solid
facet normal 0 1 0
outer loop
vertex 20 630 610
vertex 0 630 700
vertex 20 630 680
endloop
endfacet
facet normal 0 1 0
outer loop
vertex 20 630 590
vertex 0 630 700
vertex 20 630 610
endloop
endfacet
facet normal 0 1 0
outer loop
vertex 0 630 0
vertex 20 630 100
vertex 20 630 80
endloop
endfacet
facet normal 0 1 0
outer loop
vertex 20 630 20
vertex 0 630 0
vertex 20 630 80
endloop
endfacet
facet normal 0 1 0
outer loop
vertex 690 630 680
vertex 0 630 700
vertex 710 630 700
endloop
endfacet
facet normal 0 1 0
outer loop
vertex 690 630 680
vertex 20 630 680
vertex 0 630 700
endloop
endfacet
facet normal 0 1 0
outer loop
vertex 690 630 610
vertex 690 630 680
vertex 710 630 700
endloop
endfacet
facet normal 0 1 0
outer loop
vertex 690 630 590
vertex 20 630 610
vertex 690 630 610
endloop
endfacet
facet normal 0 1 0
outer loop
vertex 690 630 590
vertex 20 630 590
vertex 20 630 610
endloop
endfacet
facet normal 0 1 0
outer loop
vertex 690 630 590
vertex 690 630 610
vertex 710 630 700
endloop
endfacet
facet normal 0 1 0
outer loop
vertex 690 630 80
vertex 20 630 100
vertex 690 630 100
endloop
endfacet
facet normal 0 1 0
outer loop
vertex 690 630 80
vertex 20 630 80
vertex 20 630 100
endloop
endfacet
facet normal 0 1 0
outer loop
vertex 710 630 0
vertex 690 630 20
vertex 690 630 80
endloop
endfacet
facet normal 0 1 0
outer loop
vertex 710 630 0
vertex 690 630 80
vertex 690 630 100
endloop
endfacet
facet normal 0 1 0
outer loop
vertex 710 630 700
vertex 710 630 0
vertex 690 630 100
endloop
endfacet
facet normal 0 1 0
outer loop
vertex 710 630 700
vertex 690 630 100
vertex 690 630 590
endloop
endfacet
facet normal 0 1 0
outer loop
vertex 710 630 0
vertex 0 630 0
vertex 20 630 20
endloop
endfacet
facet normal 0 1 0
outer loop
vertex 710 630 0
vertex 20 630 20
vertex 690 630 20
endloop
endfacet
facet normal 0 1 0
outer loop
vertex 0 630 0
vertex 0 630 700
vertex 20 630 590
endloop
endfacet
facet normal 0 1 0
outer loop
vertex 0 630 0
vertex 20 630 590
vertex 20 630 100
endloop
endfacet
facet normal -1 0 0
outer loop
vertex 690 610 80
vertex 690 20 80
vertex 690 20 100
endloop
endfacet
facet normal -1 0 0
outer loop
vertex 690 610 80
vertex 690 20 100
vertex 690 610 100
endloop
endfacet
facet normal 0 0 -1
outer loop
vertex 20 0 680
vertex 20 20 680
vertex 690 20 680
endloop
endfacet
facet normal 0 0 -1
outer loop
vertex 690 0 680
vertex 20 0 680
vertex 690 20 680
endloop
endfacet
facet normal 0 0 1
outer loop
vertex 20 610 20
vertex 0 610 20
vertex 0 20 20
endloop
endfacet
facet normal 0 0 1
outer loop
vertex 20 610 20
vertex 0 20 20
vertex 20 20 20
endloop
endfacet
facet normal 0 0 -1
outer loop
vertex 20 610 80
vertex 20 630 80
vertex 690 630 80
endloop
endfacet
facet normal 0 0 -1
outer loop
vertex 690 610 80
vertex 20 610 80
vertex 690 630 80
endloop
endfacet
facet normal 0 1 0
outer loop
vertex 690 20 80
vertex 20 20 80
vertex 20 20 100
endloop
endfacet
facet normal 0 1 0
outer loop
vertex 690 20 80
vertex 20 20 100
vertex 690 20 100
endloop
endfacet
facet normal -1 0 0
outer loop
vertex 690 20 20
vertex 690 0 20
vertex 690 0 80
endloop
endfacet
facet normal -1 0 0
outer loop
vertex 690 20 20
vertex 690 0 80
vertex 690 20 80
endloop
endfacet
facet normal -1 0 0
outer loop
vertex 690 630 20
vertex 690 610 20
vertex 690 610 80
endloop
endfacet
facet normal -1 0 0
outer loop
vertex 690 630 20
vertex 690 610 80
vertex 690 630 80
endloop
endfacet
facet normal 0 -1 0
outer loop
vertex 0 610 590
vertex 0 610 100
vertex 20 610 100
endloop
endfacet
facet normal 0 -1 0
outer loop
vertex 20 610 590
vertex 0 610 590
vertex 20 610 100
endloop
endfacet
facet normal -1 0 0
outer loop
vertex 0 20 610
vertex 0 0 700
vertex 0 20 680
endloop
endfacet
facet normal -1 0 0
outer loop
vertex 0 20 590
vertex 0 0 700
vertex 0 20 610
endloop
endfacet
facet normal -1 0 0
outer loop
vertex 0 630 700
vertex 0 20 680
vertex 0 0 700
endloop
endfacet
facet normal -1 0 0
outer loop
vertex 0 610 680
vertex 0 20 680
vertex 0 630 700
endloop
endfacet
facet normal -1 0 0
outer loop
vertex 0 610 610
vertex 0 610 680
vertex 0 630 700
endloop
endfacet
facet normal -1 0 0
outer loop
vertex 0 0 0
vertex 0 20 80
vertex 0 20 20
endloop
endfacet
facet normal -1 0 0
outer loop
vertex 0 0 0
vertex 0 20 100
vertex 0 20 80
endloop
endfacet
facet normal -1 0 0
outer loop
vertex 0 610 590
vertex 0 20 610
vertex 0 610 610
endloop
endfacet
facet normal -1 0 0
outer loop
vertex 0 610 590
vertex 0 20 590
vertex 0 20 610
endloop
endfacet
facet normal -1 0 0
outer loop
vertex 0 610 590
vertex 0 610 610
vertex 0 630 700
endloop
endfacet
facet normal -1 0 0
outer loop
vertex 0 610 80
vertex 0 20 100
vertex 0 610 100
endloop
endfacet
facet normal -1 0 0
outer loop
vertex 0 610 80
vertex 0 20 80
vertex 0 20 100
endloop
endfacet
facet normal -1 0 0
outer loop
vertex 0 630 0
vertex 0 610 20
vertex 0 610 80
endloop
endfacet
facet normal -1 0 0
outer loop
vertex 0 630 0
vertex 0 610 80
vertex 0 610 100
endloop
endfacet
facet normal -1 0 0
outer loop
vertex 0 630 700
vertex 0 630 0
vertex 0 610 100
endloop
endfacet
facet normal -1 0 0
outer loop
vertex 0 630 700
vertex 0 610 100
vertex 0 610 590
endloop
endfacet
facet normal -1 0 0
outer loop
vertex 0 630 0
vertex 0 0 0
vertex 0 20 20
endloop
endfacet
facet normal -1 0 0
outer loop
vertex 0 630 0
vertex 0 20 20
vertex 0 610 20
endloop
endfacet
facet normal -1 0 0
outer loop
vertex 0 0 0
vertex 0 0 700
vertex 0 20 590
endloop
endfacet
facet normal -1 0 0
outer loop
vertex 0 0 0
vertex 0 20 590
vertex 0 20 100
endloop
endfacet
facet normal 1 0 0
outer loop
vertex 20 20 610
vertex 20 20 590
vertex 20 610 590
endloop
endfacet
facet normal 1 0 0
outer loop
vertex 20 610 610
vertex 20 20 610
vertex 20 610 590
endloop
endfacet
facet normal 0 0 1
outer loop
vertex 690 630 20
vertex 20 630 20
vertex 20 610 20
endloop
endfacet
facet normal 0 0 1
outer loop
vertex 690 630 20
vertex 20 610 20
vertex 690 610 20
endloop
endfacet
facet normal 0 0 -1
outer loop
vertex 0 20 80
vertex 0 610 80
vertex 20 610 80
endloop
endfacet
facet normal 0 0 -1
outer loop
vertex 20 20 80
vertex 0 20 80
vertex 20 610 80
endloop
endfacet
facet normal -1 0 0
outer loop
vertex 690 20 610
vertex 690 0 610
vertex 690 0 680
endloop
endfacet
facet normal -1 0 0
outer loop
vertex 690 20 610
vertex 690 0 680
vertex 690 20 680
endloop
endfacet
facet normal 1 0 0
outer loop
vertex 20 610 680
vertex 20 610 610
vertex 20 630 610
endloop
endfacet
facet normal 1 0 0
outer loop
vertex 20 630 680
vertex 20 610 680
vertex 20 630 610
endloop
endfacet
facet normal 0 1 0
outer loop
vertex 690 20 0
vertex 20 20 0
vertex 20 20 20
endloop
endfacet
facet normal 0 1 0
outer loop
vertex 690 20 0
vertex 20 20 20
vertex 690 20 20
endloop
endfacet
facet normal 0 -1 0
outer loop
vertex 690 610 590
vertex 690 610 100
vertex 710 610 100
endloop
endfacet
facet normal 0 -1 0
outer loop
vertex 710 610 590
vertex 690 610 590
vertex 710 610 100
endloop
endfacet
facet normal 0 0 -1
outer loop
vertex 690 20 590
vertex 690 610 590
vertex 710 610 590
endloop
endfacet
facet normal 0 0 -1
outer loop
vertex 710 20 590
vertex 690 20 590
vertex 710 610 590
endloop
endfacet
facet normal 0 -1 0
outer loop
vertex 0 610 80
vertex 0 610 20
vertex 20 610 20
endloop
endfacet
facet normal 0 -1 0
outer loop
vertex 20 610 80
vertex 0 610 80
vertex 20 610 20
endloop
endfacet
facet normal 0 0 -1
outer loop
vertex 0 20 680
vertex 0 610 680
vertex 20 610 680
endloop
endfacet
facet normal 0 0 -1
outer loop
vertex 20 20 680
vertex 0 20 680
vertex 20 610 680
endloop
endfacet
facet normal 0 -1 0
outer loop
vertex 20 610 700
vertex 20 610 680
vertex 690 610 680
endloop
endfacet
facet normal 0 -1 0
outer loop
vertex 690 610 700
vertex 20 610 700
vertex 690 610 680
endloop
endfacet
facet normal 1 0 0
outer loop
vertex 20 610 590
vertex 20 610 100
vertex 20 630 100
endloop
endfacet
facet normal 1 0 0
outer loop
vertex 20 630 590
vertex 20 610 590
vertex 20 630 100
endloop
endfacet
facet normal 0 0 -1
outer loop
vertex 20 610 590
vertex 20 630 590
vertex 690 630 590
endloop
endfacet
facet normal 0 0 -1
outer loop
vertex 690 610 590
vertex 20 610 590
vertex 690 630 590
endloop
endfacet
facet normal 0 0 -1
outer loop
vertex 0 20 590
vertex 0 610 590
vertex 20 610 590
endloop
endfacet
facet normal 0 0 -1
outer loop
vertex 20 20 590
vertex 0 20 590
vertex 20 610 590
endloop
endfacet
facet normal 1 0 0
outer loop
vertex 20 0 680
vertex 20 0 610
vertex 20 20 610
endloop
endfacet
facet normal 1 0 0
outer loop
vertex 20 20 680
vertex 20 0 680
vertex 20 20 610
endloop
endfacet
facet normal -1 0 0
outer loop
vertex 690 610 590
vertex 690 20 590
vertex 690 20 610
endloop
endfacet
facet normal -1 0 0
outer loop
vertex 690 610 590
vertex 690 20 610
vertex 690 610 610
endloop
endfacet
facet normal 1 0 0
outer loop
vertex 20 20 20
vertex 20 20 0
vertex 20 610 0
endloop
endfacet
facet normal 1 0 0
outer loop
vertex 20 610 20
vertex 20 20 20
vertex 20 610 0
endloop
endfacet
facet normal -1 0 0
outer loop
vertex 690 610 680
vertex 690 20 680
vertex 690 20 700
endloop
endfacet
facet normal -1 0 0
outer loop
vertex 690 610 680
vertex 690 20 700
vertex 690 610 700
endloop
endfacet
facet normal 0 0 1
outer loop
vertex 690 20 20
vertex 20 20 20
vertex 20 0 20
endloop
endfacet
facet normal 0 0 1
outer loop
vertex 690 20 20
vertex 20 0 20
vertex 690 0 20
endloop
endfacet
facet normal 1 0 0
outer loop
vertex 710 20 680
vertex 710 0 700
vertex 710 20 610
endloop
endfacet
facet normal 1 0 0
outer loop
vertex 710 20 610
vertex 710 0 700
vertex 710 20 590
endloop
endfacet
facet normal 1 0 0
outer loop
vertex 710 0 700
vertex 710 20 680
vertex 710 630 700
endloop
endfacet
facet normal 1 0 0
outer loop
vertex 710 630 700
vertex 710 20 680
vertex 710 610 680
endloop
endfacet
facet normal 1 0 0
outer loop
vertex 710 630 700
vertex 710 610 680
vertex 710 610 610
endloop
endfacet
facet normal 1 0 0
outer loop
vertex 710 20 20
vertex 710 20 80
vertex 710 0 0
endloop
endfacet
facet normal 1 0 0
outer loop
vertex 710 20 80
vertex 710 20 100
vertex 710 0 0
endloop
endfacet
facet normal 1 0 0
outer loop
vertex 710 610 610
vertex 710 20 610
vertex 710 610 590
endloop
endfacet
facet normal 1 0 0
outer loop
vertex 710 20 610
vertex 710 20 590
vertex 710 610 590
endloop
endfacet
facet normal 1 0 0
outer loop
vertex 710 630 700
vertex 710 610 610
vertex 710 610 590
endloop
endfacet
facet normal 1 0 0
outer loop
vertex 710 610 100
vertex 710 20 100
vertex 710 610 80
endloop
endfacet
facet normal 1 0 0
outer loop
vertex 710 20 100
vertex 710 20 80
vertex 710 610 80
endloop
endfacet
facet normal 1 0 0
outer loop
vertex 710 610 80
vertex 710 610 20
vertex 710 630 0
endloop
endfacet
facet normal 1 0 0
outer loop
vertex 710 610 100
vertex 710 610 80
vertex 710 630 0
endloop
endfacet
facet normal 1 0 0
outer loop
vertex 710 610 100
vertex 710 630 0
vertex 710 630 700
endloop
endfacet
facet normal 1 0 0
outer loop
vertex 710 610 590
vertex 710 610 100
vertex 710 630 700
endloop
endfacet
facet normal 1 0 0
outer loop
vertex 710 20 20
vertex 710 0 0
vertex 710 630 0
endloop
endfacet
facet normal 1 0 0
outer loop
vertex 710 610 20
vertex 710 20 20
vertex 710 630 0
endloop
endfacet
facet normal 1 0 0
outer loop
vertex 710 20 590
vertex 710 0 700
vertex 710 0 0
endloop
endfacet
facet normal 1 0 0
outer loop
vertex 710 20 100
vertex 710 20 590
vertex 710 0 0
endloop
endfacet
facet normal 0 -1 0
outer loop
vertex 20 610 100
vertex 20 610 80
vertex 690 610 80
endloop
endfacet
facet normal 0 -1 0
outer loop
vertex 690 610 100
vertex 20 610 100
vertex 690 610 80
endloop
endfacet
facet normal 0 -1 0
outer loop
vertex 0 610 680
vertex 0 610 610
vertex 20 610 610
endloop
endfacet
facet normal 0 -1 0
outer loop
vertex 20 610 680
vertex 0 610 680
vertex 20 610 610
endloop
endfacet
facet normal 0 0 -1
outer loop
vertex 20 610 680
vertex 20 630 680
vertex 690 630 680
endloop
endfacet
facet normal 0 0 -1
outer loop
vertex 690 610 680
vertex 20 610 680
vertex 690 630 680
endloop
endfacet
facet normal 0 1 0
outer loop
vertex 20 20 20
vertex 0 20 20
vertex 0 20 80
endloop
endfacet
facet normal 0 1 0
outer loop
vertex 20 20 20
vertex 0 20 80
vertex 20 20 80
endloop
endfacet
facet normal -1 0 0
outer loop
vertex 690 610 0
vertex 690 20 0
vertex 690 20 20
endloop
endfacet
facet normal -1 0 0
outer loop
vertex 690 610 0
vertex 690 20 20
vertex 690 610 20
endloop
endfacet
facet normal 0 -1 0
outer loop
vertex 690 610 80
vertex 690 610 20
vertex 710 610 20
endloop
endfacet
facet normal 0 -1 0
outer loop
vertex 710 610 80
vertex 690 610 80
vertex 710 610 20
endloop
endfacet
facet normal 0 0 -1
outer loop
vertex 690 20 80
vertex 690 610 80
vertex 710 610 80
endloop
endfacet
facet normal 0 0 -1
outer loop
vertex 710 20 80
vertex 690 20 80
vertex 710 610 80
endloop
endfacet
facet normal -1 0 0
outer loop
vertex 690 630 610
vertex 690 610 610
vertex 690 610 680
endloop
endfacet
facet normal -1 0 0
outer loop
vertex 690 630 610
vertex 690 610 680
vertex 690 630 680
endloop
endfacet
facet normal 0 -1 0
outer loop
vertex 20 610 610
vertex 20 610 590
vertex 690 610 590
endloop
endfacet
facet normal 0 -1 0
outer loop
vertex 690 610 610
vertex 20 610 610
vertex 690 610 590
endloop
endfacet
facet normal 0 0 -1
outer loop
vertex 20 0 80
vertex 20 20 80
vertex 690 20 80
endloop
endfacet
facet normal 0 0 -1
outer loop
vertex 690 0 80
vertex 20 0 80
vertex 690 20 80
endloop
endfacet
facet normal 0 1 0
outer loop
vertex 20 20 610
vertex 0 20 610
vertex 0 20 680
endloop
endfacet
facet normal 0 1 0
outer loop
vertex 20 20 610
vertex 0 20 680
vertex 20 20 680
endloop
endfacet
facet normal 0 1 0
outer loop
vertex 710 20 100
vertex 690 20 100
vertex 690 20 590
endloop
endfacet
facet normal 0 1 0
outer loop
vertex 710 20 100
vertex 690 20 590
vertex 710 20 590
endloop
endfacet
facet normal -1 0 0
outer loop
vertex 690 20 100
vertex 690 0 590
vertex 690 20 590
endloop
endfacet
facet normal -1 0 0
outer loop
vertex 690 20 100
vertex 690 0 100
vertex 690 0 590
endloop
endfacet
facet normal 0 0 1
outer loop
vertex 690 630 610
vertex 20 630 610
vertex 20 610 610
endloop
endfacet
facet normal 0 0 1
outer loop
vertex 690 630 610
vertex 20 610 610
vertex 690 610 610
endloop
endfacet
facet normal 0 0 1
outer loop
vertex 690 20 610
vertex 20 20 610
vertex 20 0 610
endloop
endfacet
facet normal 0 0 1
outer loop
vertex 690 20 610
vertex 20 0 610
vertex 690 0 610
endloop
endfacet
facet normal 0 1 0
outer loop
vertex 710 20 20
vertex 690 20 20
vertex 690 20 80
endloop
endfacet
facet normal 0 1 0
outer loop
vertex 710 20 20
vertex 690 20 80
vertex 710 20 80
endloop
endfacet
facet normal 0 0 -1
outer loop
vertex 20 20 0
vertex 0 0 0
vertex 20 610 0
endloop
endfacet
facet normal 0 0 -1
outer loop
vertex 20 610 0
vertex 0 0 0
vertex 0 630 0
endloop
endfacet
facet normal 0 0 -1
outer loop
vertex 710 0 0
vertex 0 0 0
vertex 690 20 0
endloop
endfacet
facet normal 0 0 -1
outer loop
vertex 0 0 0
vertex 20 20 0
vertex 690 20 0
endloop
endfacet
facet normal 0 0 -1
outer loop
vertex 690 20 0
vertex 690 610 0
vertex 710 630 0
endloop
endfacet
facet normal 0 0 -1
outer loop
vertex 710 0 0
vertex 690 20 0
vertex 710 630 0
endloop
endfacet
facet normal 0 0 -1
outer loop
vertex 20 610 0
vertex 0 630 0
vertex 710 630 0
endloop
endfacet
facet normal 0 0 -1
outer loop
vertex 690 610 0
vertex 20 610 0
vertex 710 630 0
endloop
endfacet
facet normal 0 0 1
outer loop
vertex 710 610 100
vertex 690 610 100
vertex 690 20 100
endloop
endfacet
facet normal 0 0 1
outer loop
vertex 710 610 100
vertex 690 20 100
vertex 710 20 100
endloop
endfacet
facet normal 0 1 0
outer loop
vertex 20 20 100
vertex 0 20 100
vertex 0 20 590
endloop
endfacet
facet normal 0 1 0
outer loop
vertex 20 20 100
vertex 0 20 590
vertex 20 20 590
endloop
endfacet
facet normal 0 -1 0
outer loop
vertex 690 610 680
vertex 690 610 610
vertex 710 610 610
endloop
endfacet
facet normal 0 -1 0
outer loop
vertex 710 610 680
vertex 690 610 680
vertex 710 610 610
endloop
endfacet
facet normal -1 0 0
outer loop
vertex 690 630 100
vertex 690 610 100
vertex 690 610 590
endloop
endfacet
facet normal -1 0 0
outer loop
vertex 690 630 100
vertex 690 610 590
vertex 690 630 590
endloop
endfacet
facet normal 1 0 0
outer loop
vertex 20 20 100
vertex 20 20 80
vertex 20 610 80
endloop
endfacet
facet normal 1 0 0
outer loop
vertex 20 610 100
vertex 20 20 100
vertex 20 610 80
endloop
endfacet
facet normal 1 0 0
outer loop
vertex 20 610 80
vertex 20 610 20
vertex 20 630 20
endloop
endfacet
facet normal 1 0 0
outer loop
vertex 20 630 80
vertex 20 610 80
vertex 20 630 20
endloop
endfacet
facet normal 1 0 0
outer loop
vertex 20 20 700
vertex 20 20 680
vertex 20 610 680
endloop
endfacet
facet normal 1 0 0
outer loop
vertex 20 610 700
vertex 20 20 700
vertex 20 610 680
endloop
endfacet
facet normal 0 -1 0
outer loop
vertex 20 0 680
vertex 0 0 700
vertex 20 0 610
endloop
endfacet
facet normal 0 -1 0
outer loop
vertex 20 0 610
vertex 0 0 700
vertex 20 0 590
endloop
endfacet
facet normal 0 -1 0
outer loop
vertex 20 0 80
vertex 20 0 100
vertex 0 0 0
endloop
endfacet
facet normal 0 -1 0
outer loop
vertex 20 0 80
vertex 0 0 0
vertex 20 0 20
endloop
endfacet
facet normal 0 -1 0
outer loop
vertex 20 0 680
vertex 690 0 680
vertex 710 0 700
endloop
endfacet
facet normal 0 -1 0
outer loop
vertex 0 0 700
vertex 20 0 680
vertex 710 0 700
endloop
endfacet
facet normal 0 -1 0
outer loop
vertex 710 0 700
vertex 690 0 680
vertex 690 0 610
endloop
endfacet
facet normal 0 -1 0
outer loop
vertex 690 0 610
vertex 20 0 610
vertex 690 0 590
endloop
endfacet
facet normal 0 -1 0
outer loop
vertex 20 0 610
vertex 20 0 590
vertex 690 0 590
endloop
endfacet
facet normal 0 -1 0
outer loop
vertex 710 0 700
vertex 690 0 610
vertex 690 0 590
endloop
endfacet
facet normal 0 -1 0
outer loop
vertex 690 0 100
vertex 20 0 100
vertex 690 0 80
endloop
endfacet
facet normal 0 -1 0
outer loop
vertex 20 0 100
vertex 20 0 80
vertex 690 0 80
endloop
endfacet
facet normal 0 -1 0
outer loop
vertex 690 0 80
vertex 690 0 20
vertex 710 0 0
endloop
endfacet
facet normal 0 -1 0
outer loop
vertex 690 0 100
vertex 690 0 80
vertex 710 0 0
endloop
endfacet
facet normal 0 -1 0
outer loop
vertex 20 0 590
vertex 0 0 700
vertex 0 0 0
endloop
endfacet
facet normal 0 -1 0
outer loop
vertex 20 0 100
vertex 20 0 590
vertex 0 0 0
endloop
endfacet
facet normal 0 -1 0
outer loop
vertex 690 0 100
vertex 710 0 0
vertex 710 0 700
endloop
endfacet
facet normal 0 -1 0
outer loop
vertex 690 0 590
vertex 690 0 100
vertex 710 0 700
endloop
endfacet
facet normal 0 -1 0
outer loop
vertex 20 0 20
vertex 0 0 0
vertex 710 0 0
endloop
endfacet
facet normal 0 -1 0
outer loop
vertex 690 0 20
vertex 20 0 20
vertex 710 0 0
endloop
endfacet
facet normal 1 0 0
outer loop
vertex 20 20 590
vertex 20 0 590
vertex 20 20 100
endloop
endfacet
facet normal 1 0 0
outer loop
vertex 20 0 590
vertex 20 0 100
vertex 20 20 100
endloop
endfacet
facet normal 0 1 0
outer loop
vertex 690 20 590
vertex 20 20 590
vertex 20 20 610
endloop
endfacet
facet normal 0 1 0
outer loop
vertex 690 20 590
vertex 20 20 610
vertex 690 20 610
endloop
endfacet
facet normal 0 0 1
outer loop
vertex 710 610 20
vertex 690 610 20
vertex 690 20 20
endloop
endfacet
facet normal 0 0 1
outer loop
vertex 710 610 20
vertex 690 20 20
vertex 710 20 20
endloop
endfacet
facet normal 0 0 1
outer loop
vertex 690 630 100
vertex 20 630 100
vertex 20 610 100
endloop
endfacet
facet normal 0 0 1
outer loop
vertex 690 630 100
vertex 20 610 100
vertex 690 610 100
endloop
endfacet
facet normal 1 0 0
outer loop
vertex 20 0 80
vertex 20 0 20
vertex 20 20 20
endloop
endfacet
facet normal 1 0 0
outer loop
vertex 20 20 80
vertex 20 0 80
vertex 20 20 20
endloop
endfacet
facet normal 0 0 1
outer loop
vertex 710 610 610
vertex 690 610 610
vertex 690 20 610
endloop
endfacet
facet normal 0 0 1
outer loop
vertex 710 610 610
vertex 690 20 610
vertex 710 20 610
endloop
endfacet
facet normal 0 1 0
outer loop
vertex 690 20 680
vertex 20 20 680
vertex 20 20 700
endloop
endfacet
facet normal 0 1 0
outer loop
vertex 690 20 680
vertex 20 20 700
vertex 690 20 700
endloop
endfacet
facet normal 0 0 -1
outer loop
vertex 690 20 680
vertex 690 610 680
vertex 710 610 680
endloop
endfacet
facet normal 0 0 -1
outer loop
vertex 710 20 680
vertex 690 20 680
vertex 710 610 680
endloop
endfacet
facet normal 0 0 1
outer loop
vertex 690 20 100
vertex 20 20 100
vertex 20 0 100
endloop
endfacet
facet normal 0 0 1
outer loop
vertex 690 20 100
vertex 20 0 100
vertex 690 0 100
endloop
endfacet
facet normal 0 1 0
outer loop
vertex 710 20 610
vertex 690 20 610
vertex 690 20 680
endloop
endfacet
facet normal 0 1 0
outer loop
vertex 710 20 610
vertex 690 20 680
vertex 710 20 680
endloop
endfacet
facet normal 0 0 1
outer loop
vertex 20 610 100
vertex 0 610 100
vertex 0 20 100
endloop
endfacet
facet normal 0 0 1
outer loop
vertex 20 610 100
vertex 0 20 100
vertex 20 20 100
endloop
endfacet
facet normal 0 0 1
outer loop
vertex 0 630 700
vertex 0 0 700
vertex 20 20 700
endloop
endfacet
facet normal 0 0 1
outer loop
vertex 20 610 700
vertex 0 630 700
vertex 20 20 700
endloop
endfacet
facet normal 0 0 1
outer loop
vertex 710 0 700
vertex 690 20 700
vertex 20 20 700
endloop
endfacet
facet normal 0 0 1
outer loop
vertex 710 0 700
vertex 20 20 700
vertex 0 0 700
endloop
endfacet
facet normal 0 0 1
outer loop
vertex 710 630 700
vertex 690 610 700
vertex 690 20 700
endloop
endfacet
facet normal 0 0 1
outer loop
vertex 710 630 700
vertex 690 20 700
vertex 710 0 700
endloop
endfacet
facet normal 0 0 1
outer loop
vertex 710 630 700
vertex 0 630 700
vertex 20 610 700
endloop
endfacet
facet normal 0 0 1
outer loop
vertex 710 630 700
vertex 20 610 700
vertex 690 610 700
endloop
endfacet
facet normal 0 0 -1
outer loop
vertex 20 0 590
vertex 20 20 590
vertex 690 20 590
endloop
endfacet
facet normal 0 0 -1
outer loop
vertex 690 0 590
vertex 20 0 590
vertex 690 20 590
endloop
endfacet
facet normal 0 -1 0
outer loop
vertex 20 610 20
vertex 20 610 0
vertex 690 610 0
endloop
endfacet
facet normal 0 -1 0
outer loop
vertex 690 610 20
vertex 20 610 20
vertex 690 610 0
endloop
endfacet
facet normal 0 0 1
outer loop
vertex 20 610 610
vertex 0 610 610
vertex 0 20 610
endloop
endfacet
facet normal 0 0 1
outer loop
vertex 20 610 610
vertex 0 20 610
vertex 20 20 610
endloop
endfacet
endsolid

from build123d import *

# Parameters (mm, degrees)
BOX001_W         = 20
BOX001_H         = 590
BOX001_DEPTH     = 20
ARRAY001_X_COUNT = 2
ARRAY001_X_PITCH = 690
ARRAY001_Z_COUNT = 2
ARRAY001_Z_PITCH = 80
BOX003_W         = 20
BOX003_H         = 590
BOX003_DEPTH     = 20
ARRAY002_X_COUNT = 2
ARRAY002_X_PITCH = 690
ARRAY002_Z_COUNT = 2
ARRAY002_Z_PITCH = 90
BOX002_W         = 670
BOX002_H         = 20
BOX002_DEPTH     = 20
ARRAY003_Y_COUNT = 2
ARRAY003_Y_PITCH = 610
ARRAY003_Z_COUNT = 2
ARRAY003_Z_PITCH = 80
BOX004_W         = 670
BOX004_H         = 20
BOX004_DEPTH     = 20
ARRAY004_Y_COUNT = 2
ARRAY004_Y_PITCH = 610
ARRAY004_Z_COUNT = 2
ARRAY004_Z_PITCH = 90
BOX_W            = 20
BOX_H            = 20
BOX_DEPTH        = 700
ARRAY_X_COUNT    = 2
ARRAY_X_PITCH    = 690
ARRAY_Y_COUNT    = 2
ARRAY_Y_PITCH    = 610


with BuildPart() as laterales_inferiores:
    # Box001 → Box001 (new body)
    with BuildSketch(Plane(origin=(0, 20, 0), x_dir=(1, 0, 0), z_dir=(0, 0, 1))):
        with Locations((10, 295)):
            Rectangle(BOX001_W, BOX001_H)
    extrude(amount=BOX001_DEPTH)

    # Array001 X: Laterales inferiores ×2


with BuildPart() as laterales_inferiores_1:
    add(laterales_inferiores.part)
    with Locations(*[(i * ARRAY001_X_PITCH, 0, 0) for i in range(1, ARRAY001_X_COUNT)]):
        add(laterales_inferiores.part)

    # Array001 Z: Laterales inferiores ×2


with BuildPart() as laterales_inferiores_2:
    add(laterales_inferiores_1.part)
    with Locations(*[(0, 0, i * ARRAY001_Z_PITCH) for i in range(1, ARRAY001_Z_COUNT)]):
        add(laterales_inferiores_1.part)


with BuildPart() as laterales_superiores:
    # Box003 → Box003 (new body)
    with BuildSketch(Plane(origin=(0, 20, 0), x_dir=(1, 0, 0), z_dir=(0, 0, 1))):
        with Locations((10, 295)):
            Rectangle(BOX003_W, BOX003_H)
    extrude(amount=BOX003_DEPTH)

    # Array002 X: Laterales Superiores ×2


with BuildPart() as laterales_superiores_1:
    add(laterales_superiores.part)
    with Locations(*[(i * ARRAY002_X_PITCH, 0, 0) for i in range(1, ARRAY002_X_COUNT)]):
        add(laterales_superiores.part)

    # Array002 Z: Laterales Superiores ×2


with BuildPart() as laterales_superiores_2:
    add(laterales_superiores_1.part)
    with Locations(*[(0, 0, i * ARRAY002_Z_PITCH) for i in range(1, ARRAY002_Z_COUNT)]):
        add(laterales_superiores_1.part)


with BuildPart() as laterales_superiores_3:
    # Array002 placement: moved
    add(laterales_superiores_2.part.moved(Location((0, 0, 590))))


with BuildPart() as frontales_inferiores:
    # Box002 → Box002 (new body)
    with BuildSketch(Plane(origin=(20, 0, 0), x_dir=(1, 0, 0), z_dir=(0, 0, 1))):
        with Locations((335, 10)):
            Rectangle(BOX002_W, BOX002_H)
    extrude(amount=BOX002_DEPTH)

    # Array003 Y: Frontales inferiores ×2


with BuildPart() as frontales_inferiores_1:
    add(frontales_inferiores.part)
    with Locations(*[(0, i * ARRAY003_Y_PITCH, 0) for i in range(1, ARRAY003_Y_COUNT)]):
        add(frontales_inferiores.part)

    # Array003 Z: Frontales inferiores ×2


with BuildPart() as frontales_inferiores_2:
    add(frontales_inferiores_1.part)
    with Locations(*[(0, 0, i * ARRAY003_Z_PITCH) for i in range(1, ARRAY003_Z_COUNT)]):
        add(frontales_inferiores_1.part)


with BuildPart() as frontales_superiores:
    # Box004 → Box004 (new body)
    with BuildSketch(Plane(origin=(20, 0, 0), x_dir=(1, 0, 0), z_dir=(0, 0, 1))):
        with Locations((335, 10)):
            Rectangle(BOX004_W, BOX004_H)
    extrude(amount=BOX004_DEPTH)

    # Array004 Y: Frontales superiores ×2


with BuildPart() as frontales_superiores_1:
    add(frontales_superiores.part)
    with Locations(*[(0, i * ARRAY004_Y_PITCH, 0) for i in range(1, ARRAY004_Y_COUNT)]):
        add(frontales_superiores.part)

    # Array004 Z: Frontales superiores ×2


with BuildPart() as frontales_superiores_2:
    add(frontales_superiores_1.part)
    with Locations(*[(0, 0, i * ARRAY004_Z_PITCH) for i in range(1, ARRAY004_Z_COUNT)]):
        add(frontales_superiores_1.part)


with BuildPart() as frontales_superiores_3:
    # Array004 placement: moved
    add(frontales_superiores_2.part.moved(Location((0, 0, 590))))


with BuildPart() as estructura_externa:
    # Box → Box (new body)
    with BuildSketch(Plane.XY):
        with Locations((10, 10)):
            Rectangle(BOX_W, BOX_H)
    extrude(amount=BOX_DEPTH)

    # Array X: Estructura externa ×2


with BuildPart() as estructura_externa_1:
    add(estructura_externa.part)
    with Locations(*[(i * ARRAY_X_PITCH, 0, 0) for i in range(1, ARRAY_X_COUNT)]):
        add(estructura_externa.part)

    # Array Y: Estructura externa ×2


with BuildPart() as estructura_externa_2:
    add(estructura_externa_1.part)
    with Locations(*[(0, i * ARRAY_Y_PITCH, 0) for i in range(1, ARRAY_Y_COUNT)]):
        add(estructura_externa_1.part)

    # Fusion: union Laterales inferiores, Laterales Superiores, Frontales inferiores, Frontales superiores
    add(laterales_inferiores_2.part)
    add(laterales_superiores_3.part)
    add(frontales_inferiores_2.part)
    add(frontales_superiores_3.part)


solid = estructura_externa_2.part
